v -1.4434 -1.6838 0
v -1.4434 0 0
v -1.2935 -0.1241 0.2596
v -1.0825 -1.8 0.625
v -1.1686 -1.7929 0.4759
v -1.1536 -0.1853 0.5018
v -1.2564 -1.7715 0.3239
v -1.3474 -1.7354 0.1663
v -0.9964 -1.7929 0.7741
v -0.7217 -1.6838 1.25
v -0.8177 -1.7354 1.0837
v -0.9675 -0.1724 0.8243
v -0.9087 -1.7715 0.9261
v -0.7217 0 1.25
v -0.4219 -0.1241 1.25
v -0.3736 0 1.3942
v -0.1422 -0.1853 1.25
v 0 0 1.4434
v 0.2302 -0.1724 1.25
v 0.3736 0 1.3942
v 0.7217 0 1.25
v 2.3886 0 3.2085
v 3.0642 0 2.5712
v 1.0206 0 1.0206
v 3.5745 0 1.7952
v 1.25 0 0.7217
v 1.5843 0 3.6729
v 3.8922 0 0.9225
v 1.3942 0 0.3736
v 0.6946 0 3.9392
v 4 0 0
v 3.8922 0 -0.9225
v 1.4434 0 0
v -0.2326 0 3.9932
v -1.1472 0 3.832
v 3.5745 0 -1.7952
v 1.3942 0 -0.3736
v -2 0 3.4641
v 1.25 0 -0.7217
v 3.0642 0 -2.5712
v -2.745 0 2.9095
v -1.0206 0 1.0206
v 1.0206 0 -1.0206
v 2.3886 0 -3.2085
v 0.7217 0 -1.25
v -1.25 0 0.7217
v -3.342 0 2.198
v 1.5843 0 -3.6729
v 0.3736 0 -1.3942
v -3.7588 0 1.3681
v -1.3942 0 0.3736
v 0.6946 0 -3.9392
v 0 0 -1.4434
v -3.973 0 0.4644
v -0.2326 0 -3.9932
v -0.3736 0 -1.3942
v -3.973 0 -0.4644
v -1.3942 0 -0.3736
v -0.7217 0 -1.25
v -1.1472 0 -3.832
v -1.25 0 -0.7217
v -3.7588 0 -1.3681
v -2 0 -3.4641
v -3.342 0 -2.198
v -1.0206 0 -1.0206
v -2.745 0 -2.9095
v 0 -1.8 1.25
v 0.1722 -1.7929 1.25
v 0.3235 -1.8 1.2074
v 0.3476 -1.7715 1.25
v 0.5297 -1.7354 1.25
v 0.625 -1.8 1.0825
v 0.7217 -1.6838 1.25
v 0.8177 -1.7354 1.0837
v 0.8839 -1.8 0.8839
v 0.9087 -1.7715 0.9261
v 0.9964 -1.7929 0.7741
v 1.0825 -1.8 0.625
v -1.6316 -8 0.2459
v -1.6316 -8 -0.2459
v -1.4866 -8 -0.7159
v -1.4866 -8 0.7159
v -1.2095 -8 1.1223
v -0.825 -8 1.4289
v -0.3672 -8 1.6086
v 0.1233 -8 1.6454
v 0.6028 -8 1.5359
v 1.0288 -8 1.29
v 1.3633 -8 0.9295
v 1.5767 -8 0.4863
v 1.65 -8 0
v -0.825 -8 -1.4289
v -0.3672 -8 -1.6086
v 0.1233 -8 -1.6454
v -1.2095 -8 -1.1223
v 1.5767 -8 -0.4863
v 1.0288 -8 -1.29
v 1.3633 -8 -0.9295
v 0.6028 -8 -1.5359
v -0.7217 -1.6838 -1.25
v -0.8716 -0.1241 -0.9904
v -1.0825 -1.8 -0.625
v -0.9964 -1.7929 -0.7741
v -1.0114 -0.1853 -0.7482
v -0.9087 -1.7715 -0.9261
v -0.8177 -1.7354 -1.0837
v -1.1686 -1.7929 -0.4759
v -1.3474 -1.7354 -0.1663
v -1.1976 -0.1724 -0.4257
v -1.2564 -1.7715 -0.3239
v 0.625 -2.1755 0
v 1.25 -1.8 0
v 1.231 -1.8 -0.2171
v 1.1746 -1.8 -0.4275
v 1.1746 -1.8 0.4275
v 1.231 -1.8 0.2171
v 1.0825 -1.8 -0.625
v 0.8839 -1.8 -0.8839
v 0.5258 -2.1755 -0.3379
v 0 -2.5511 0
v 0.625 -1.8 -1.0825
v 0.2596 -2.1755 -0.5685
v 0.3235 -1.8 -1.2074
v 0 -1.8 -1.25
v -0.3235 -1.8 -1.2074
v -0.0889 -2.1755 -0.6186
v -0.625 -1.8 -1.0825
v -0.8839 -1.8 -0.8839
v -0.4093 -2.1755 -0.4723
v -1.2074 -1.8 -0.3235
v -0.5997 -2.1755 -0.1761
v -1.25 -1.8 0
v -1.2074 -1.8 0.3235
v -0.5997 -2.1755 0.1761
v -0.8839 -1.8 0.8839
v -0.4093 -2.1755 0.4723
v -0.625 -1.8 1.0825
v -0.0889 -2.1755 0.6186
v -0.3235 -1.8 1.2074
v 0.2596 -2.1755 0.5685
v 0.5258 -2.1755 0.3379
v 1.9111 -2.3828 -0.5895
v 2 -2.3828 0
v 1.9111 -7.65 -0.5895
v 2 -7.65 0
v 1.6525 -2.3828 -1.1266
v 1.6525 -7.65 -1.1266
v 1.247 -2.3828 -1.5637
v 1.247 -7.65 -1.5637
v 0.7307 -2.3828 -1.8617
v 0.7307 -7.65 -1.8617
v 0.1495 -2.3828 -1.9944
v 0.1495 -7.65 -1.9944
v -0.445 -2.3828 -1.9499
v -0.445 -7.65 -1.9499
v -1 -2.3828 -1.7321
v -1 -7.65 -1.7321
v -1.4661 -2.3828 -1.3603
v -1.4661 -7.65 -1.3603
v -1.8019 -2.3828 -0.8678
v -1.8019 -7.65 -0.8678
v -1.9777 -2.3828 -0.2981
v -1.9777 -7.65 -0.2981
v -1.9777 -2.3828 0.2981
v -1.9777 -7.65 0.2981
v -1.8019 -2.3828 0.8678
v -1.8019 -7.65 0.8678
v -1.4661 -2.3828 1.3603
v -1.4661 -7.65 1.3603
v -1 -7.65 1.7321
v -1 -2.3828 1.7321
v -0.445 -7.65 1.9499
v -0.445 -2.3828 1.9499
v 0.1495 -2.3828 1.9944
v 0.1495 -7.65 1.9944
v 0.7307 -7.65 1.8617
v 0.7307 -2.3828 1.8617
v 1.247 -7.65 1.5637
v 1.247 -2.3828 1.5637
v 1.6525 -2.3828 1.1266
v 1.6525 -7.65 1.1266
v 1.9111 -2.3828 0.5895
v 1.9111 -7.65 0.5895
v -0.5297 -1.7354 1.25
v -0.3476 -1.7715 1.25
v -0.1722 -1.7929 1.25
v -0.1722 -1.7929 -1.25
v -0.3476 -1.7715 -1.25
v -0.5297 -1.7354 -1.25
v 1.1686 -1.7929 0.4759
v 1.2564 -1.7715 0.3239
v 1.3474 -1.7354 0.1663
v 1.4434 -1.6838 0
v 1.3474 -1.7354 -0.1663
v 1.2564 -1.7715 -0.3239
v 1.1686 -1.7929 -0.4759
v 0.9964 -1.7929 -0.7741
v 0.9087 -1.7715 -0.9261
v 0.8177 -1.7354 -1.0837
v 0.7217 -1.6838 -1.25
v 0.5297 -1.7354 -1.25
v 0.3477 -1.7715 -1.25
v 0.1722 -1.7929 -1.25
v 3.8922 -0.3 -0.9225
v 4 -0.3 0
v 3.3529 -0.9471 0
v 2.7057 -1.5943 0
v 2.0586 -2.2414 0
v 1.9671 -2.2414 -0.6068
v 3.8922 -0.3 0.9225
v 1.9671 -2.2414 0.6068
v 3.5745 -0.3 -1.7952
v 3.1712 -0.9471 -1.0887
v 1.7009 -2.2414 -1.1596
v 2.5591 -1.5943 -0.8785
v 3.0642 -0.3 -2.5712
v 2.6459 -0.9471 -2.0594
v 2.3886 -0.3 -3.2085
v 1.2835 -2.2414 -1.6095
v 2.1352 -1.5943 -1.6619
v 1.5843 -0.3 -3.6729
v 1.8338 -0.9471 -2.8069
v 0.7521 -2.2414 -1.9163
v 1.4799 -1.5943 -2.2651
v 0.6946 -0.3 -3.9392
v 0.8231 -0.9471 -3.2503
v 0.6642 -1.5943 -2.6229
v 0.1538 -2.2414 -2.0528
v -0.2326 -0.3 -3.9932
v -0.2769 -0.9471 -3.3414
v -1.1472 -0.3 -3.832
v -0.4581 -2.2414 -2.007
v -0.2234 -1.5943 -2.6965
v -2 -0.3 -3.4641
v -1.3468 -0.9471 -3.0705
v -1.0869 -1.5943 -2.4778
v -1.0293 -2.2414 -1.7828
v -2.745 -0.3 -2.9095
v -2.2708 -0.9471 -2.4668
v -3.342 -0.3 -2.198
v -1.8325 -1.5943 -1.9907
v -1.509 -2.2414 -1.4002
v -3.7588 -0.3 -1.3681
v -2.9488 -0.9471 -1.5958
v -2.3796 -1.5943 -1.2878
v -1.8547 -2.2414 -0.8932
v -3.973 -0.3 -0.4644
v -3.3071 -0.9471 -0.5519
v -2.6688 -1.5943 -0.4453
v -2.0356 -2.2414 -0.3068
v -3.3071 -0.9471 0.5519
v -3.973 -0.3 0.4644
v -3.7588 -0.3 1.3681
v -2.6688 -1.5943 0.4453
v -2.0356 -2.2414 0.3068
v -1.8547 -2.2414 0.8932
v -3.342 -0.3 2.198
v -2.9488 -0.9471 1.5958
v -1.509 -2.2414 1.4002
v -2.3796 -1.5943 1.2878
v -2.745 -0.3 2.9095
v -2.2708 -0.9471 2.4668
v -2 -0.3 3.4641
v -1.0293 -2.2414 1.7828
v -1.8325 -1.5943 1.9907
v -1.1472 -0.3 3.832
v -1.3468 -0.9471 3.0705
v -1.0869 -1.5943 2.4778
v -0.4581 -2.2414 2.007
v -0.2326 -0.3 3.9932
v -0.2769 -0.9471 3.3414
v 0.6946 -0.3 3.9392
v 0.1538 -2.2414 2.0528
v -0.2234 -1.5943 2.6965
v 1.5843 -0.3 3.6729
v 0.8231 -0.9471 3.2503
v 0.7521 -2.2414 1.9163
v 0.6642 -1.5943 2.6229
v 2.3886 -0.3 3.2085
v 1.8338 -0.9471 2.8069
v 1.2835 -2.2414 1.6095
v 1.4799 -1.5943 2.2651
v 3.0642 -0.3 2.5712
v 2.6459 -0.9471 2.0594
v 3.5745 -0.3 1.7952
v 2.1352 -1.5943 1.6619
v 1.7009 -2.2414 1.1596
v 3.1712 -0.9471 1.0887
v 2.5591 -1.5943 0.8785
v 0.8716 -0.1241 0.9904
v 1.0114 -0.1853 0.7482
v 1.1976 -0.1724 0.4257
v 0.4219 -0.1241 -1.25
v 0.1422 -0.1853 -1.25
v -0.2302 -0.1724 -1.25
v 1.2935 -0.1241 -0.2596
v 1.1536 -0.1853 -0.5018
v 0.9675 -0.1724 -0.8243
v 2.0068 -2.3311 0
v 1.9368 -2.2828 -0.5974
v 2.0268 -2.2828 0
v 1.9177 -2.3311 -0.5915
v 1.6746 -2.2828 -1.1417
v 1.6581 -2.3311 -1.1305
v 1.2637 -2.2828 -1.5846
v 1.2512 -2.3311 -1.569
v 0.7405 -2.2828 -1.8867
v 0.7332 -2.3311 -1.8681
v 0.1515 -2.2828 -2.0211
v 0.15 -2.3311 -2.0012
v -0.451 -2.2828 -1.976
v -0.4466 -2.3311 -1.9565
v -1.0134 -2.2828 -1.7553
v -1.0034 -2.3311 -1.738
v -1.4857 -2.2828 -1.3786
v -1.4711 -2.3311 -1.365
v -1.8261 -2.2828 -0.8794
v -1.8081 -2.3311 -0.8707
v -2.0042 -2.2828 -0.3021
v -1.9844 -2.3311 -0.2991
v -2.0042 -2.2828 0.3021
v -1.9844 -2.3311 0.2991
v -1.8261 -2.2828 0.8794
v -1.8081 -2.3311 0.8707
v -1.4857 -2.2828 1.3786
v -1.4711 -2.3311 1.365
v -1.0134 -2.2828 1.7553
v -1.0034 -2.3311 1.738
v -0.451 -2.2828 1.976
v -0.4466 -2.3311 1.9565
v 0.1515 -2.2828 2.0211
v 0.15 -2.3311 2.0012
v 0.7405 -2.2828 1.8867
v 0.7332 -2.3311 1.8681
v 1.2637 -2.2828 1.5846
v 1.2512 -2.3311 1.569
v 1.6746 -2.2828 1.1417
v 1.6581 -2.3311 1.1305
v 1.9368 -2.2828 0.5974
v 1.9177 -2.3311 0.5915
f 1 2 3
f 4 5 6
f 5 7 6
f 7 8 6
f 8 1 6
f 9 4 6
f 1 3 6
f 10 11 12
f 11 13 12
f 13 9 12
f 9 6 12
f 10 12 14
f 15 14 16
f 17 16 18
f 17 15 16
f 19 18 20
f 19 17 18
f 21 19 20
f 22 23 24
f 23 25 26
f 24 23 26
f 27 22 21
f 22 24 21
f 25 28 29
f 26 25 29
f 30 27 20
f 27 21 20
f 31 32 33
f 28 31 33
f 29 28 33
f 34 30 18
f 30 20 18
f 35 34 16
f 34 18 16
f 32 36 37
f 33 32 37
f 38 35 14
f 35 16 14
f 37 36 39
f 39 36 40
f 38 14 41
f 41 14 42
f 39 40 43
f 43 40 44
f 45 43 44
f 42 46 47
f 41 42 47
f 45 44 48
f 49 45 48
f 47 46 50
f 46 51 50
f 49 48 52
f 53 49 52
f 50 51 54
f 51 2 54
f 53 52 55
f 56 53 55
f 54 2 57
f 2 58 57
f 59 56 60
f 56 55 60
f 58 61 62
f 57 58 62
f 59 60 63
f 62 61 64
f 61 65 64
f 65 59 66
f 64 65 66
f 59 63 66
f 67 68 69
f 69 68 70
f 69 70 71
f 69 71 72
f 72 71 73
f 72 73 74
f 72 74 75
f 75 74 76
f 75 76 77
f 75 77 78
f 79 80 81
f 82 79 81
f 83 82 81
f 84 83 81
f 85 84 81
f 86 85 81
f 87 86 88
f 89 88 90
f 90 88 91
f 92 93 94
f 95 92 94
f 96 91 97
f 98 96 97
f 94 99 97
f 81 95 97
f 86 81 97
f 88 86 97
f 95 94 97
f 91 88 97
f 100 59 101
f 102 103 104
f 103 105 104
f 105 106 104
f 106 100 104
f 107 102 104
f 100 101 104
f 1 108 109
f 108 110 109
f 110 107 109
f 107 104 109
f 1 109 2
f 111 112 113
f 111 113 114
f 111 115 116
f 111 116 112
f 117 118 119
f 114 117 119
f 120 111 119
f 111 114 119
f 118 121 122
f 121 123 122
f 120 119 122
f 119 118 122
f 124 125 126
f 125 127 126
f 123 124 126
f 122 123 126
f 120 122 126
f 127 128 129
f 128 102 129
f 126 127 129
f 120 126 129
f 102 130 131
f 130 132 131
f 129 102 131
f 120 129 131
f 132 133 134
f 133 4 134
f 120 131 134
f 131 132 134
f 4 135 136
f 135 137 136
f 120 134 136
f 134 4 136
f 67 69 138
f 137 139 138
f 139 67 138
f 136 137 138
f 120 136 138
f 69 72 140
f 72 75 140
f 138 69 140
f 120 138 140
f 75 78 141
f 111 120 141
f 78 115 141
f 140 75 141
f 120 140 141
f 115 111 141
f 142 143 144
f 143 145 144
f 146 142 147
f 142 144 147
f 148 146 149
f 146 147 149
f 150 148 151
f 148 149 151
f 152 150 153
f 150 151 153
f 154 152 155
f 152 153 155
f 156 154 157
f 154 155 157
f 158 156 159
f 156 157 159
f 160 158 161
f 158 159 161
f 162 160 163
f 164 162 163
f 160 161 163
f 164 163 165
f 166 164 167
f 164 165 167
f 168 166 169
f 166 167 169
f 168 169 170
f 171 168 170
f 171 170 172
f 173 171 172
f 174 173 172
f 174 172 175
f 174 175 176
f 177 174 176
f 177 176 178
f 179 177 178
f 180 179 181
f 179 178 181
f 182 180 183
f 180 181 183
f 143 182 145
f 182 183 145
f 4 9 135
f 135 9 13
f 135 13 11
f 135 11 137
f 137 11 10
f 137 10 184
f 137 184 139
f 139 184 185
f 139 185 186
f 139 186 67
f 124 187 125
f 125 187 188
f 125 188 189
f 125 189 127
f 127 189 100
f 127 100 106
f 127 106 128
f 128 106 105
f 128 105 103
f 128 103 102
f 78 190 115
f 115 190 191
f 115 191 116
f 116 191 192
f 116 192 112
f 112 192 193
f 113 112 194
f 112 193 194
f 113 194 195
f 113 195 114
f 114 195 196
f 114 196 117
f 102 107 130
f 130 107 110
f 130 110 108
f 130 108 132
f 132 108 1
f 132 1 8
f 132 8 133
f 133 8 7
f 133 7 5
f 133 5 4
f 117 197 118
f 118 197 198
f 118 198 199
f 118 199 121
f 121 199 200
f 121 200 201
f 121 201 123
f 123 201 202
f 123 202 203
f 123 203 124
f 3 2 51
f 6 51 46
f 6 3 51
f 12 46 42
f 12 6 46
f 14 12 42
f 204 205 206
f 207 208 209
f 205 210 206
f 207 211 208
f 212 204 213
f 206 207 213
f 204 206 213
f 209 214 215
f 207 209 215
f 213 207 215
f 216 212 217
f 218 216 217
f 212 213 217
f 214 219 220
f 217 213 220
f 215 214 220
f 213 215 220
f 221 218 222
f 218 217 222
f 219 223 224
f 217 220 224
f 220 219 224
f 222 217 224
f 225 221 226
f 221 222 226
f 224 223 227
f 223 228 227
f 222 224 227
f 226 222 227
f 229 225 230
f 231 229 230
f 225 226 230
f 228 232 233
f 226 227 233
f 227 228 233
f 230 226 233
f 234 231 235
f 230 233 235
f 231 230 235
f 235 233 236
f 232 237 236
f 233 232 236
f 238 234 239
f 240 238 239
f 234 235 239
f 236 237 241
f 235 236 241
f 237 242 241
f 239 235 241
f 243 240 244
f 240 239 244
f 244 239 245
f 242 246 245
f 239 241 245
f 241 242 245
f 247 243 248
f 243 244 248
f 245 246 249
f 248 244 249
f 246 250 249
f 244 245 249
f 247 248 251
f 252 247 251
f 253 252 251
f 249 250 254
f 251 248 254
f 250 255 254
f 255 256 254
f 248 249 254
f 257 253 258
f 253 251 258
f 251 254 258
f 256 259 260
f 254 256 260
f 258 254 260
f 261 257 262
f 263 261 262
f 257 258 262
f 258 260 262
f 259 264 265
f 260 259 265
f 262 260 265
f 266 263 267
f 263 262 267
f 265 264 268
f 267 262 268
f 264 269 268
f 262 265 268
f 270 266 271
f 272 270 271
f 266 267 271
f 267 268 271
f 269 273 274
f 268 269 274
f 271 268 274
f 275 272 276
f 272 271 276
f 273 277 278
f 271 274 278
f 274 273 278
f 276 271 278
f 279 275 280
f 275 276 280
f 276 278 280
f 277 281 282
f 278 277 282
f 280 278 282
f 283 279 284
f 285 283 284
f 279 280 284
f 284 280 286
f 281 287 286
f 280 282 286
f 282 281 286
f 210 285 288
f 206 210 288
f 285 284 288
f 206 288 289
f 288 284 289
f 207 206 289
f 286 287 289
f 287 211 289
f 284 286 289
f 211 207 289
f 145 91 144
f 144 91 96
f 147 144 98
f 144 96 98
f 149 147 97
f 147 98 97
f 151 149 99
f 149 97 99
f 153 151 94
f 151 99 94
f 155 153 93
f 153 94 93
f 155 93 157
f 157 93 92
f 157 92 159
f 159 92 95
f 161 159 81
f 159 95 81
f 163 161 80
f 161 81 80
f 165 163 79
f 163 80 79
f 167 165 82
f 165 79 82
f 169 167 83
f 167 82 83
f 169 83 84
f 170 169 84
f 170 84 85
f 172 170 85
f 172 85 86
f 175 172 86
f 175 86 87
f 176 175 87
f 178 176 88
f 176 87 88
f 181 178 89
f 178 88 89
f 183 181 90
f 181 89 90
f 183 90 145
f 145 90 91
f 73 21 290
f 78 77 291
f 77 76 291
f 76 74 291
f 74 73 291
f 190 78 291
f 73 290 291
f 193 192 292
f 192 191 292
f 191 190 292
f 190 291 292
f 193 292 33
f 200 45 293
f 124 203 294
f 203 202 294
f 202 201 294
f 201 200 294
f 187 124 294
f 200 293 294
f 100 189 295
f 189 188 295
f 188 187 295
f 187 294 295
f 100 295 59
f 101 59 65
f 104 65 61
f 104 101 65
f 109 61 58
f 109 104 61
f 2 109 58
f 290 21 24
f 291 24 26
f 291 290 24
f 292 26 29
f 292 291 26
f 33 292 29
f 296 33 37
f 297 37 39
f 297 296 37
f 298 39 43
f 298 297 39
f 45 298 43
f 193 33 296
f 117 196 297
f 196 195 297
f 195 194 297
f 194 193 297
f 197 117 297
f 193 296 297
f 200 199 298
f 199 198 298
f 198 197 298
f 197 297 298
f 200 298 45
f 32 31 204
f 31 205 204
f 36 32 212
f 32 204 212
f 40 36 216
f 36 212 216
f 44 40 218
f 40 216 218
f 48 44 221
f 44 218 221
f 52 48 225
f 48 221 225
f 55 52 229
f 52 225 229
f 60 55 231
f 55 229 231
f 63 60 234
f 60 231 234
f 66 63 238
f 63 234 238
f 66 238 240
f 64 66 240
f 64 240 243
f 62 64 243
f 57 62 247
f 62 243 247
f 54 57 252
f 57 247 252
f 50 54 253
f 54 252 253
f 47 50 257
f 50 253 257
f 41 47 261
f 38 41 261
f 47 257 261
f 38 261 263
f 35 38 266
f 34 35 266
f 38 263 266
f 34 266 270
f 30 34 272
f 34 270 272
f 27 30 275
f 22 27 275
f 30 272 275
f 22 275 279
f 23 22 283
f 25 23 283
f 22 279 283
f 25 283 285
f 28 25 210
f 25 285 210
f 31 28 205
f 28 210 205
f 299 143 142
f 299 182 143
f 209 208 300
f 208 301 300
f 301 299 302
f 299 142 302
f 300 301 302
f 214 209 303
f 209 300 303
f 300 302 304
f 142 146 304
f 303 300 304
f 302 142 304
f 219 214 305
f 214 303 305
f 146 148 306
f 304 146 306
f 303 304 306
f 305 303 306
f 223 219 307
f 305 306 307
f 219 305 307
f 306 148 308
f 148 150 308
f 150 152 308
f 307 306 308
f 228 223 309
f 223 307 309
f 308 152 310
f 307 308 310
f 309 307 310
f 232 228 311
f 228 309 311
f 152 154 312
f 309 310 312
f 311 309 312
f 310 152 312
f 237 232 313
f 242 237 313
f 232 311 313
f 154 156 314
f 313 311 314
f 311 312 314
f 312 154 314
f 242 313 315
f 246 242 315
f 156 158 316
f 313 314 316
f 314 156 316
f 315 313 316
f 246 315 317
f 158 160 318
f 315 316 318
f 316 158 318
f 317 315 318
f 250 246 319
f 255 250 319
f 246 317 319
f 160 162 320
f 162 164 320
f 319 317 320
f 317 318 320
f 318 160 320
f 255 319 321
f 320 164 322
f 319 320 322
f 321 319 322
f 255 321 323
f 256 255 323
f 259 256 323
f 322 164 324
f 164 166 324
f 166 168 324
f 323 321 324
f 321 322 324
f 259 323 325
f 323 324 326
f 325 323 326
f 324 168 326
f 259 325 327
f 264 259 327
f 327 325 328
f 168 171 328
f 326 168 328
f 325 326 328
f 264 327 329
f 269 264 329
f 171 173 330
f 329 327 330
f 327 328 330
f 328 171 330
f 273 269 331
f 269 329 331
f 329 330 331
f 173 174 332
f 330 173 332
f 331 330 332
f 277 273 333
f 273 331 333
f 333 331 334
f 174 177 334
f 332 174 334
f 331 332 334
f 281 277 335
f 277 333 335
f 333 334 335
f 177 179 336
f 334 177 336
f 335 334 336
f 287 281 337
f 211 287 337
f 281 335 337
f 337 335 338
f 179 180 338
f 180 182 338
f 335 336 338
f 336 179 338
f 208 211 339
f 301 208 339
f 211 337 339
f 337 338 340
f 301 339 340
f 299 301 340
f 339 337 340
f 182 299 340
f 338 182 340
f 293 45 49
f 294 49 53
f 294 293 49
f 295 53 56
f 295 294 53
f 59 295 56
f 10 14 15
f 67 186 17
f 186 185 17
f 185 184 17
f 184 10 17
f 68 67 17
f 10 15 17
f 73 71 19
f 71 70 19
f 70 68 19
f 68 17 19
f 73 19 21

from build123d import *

# Parameters (mm, degrees)
CORTE_EXTRUS_O1_REACH = 11.798


with BuildPart() as part:
    # Esboço1 → Revolução1 (revolve)
    with BuildSketch(Plane.XY):
        with BuildLine():
            Line((0, -2.551075774), (1.25, -1.8))
            Line((1.25, -1.8), (1.25, 0))
            Line((1.25, 0), (4, 0))
            Line((4, 0), (4, -0.3))
            Line((4, -0.3), (2.058578644, -2.241421356))
            ThreePointArc((2.058578644, -2.241421356), (2.015224094, -2.306306026), (2, -2.382842712))
            Line((2, -2.382842712), (2, -7.65))
            Line((2, -7.65), (1.65, -8))
            Line((1.65, -8), (0, -8))
            Line((0, -8), (0, -2.551075774))
        make_face()
    revolve(axis=Axis((0, -1000, 0), (0, 1, 0)))

    # Corte-extrusão1: up to this cone (the profile starts inside it)
    corte_extrus_o1_end = Plane(origin=(0, 0, 0), z_dir=(0, 1, 0)).offset(-2.551074774) * Cone(1.664e-06, 31.779048647, 19.094777842, align=(Align.CENTER, Align.CENTER, Align.MIN), mode=Mode.PRIVATE)
    # Esboço2 → Corte-extrusão1 (cut, up to the surface)
    with BuildSketch(Plane(origin=(0, 0, 0), x_dir=(1, 0, 0), z_dir=(0, 1, 0)), mode=Mode.PRIVATE) as corte_extrus_o1_sk1:
        Polygon((-1.443375673, 0), (-0.721687836, -1.25), (0.721687836, -1.25), (1.443375673, 0), (0.721687836, 1.25), (-0.721687836, 1.25), align=None)
    corte_extrus_o1_tool1 = extrude(corte_extrus_o1_sk1.sketch, amount=-CORTE_EXTRUS_O1_REACH, mode=Mode.PRIVATE) & corte_extrus_o1_end
    add(corte_extrus_o1_tool1.solids().sort_by_distance((0, 0, 0))[0], mode=Mode.SUBTRACT)

    # Esboço3 → Corte-Revolução1 (revolve, cut)
    with BuildSketch(Plane.XY, mode=Mode.PRIVATE) as corte_revolu_o1_sk:
        Polygon((1.443375673, 0), (0, -1.443375673), (0, 0), align=None)
    revolve(corte_revolu_o1_sk.sketch.rotate(Axis((0, -1000, 0), (0, 1, 0)), 180), axis=Axis((0, -1000, 0), (0, 1, 0)), mode=Mode.SUBTRACT)


solid = part.part
